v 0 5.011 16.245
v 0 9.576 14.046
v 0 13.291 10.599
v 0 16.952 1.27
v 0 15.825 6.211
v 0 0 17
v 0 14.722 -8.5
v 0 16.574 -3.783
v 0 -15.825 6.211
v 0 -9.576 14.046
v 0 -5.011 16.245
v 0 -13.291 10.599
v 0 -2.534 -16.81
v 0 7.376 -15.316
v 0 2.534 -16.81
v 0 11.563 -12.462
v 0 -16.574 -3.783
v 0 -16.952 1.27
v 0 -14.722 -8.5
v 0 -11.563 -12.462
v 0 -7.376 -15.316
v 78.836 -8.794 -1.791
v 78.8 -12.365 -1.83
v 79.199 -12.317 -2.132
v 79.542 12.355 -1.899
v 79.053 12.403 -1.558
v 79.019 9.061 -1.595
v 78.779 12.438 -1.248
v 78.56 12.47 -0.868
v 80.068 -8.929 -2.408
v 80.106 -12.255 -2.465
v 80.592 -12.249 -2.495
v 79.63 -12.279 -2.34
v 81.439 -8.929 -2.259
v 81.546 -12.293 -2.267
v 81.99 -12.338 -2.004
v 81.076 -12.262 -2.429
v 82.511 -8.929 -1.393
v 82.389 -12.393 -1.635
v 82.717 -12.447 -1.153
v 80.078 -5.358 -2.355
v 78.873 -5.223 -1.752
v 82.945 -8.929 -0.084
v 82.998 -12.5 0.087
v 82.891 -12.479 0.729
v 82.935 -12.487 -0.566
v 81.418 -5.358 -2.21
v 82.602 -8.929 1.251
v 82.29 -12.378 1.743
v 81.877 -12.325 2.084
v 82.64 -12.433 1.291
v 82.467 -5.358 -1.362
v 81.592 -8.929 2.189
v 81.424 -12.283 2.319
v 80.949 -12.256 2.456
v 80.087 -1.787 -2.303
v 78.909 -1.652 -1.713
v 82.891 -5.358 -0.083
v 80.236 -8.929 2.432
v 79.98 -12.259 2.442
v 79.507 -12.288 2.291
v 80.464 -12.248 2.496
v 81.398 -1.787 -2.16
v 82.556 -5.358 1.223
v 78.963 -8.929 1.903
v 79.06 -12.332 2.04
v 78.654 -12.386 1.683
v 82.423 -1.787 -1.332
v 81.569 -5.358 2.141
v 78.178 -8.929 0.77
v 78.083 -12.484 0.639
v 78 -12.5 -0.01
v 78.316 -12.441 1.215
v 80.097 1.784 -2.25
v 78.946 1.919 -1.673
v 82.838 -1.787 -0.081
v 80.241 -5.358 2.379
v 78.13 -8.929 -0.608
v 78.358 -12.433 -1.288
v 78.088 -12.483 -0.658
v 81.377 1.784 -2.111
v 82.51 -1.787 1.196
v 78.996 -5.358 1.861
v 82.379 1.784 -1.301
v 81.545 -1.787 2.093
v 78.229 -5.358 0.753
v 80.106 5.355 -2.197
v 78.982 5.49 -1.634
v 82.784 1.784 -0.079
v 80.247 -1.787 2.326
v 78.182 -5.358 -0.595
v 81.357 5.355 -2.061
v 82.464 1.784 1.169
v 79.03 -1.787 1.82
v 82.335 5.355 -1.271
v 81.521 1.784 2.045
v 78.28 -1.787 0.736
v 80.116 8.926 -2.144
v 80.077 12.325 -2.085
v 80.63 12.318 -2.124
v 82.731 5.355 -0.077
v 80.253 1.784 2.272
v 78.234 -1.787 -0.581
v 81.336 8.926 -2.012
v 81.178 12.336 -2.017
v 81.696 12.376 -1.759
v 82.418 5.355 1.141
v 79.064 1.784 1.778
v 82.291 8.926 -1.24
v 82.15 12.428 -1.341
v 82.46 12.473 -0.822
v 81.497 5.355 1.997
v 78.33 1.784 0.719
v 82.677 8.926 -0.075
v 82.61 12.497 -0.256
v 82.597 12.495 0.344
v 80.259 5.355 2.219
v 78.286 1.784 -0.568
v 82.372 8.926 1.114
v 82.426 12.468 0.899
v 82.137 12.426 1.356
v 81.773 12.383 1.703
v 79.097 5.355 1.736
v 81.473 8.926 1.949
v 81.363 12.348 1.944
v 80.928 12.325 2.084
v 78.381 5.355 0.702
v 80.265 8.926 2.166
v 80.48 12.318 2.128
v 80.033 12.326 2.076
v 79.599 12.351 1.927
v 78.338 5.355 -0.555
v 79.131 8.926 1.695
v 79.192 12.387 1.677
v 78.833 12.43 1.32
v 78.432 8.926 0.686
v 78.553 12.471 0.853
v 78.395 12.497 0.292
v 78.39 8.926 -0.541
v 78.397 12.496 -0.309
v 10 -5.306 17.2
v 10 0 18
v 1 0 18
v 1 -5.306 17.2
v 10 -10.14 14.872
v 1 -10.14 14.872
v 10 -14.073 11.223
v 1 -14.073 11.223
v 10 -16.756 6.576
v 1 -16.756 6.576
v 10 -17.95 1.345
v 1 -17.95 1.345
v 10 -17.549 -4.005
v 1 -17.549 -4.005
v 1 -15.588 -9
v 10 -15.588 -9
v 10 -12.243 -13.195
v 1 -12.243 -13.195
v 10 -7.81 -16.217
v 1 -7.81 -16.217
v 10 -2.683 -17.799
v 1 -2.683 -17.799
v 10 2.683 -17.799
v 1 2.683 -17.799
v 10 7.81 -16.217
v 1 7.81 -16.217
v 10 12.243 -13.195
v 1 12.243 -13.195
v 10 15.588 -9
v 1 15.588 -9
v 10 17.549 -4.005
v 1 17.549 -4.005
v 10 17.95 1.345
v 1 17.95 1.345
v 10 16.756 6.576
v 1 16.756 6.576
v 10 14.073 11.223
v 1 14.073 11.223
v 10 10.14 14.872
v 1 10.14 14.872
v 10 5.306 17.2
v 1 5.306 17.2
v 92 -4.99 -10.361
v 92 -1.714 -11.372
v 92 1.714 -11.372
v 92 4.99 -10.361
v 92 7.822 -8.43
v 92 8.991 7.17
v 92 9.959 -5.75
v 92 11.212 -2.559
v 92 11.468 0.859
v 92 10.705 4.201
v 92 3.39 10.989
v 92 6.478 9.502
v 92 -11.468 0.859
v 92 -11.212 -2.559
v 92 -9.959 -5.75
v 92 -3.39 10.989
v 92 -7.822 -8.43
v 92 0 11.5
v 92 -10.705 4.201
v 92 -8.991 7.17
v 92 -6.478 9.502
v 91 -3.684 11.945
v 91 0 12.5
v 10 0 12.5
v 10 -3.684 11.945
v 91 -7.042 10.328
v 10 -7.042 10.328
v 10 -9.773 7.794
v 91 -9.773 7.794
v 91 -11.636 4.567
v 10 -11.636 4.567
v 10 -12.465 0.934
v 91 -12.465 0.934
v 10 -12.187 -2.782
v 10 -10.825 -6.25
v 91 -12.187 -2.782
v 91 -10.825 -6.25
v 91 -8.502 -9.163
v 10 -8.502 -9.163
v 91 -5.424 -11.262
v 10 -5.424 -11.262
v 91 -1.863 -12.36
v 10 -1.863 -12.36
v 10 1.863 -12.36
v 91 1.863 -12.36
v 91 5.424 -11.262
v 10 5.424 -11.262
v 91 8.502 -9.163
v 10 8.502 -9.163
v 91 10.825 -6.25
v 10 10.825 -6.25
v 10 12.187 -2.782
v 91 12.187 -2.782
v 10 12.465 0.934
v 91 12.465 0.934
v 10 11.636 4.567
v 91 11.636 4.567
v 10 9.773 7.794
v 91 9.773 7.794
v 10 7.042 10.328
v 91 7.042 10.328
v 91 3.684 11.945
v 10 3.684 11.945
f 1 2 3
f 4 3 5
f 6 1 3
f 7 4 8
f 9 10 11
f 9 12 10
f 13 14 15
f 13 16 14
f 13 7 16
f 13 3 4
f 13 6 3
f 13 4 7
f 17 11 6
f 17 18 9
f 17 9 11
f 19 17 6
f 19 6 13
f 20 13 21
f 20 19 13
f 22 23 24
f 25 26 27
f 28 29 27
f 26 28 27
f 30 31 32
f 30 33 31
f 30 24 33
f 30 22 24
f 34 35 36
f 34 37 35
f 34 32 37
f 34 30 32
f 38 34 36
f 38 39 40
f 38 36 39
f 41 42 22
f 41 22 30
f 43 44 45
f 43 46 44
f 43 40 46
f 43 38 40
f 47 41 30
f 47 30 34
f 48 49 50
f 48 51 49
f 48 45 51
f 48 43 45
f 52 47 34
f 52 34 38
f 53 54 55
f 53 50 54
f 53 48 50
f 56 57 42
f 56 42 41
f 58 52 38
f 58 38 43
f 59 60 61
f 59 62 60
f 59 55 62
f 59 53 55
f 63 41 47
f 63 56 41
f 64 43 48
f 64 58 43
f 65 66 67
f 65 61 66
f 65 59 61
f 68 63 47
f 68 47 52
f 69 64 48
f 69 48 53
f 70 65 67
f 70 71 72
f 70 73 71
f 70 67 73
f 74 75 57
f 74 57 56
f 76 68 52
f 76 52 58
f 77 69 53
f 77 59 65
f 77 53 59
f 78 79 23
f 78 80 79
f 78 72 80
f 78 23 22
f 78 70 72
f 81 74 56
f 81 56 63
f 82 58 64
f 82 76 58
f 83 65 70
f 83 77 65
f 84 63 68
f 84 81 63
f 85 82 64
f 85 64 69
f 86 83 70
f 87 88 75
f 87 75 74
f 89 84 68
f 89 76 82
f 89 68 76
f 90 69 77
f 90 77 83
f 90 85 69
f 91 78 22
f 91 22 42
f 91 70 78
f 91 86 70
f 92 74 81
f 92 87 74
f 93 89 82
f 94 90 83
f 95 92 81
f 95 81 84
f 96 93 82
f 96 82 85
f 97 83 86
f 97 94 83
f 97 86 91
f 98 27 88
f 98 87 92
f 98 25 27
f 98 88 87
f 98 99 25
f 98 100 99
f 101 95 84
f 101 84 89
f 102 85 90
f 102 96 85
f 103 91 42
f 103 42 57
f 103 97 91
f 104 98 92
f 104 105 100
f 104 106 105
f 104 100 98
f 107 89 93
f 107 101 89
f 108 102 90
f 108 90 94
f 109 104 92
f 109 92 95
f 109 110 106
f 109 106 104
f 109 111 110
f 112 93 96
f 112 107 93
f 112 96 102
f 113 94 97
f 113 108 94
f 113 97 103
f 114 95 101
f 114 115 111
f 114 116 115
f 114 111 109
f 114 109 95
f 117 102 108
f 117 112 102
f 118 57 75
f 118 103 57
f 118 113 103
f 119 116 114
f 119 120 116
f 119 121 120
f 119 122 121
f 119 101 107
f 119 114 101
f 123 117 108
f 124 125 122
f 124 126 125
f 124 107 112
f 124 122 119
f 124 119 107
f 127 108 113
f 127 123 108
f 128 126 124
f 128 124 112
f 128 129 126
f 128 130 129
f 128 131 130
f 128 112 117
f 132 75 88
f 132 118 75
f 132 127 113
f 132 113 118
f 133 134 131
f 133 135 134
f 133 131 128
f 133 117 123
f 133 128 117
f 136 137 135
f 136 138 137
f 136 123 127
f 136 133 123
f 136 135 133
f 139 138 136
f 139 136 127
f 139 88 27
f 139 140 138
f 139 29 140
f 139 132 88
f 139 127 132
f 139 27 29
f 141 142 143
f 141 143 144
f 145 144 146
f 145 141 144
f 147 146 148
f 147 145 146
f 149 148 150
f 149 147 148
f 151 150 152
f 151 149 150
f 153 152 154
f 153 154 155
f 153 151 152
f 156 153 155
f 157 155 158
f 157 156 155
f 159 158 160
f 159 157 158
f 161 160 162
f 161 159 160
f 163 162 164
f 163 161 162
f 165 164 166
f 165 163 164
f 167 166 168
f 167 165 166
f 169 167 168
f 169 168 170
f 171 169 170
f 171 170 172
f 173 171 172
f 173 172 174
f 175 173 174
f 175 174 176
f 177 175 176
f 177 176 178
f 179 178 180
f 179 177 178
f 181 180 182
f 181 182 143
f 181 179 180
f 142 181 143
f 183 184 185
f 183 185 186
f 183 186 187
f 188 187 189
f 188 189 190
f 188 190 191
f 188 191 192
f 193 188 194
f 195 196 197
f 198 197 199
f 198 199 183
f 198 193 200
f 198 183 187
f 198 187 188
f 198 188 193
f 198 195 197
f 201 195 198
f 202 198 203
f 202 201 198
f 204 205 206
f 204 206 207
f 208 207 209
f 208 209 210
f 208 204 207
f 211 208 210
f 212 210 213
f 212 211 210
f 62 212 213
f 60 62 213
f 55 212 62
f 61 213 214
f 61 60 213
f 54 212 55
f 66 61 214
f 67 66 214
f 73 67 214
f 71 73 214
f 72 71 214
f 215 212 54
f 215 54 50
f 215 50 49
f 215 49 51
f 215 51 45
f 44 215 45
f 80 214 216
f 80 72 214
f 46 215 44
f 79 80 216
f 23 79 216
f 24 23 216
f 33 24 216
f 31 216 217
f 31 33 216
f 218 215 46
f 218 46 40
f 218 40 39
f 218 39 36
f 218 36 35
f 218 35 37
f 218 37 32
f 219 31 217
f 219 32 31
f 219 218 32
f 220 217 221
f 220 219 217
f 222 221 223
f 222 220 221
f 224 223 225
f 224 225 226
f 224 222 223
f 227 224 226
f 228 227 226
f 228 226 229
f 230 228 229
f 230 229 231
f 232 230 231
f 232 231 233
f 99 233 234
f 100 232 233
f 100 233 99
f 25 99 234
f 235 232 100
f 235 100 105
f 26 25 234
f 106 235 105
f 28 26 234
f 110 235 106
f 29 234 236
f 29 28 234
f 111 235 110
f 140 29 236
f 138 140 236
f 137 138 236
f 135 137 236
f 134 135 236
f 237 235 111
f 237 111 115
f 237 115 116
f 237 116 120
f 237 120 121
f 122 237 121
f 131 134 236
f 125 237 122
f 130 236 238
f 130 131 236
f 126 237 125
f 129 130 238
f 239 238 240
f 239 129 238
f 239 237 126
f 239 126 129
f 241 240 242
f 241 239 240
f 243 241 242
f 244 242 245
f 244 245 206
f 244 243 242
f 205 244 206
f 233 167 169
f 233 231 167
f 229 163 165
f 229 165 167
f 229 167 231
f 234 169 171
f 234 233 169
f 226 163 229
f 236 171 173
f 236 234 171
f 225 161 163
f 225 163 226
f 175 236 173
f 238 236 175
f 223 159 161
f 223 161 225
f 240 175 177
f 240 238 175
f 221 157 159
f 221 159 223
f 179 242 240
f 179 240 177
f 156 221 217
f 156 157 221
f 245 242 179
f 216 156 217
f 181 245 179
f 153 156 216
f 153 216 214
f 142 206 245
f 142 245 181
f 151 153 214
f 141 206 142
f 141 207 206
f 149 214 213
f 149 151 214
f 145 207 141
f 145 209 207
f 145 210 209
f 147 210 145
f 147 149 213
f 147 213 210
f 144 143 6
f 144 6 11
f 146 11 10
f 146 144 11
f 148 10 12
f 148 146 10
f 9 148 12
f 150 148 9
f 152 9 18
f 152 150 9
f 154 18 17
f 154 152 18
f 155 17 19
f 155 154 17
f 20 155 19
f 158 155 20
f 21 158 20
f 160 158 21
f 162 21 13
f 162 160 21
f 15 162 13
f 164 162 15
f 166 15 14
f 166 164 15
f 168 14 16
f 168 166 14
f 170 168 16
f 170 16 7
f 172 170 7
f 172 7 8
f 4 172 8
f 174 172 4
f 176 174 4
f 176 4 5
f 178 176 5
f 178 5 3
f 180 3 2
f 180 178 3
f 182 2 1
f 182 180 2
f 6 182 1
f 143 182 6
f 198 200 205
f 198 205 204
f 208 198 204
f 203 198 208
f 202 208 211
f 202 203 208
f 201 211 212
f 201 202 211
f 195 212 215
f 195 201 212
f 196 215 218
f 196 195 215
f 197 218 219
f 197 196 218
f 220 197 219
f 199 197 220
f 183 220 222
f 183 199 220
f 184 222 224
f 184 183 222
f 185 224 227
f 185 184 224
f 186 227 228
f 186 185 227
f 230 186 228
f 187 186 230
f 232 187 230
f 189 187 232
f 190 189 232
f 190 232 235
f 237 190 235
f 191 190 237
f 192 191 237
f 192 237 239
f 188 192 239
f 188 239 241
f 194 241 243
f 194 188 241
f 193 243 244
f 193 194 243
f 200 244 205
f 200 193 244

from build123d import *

# Parameters (mm, degrees)
CHAMFER1_SIZE = 1


with BuildPart() as part:
    # Sketch1 → Revolve1 (revolve)
    with BuildSketch(Plane.XY, mode=Mode.PRIVATE) as revolve1_sk:
        Polygon((0, 0), (0, 18), (10, 18), (10, 12.5), (92, 12.5), (92, 0), align=None)
    revolve(revolve1_sk.sketch.rotate(Axis((0, 0, 0), (1, 0, 0)), 90), axis=Axis((0, 0, 0), (1, 0, 0)))

    # Sketch2 → Cut-Revolve1 (revolve, cut)
    with BuildSketch(Plane.XY, mode=Mode.PRIVATE) as cut_revolve1_sk:
        Polygon((83, -12.5), (82.625, 12.5), (80.5, 12.5), (80.5, -12.5), align=None)
    revolve(cut_revolve1_sk.sketch.rotate(Axis((80.5, 12.5, 0), (0, -1, 0)), 227.113167314), axis=Axis((80.5, 12.5, 0), (0, -1, 0)), mode=Mode.SUBTRACT)

    # Chamfer1
    chamfer1_edges = [part.edges().sort_by_distance(p)[0] for p in [
        (92, 0, -12.5),
        (0, 0, -18),
    ]]
    chamfer(chamfer1_edges, length=CHAMFER1_SIZE)


solid = part.part
